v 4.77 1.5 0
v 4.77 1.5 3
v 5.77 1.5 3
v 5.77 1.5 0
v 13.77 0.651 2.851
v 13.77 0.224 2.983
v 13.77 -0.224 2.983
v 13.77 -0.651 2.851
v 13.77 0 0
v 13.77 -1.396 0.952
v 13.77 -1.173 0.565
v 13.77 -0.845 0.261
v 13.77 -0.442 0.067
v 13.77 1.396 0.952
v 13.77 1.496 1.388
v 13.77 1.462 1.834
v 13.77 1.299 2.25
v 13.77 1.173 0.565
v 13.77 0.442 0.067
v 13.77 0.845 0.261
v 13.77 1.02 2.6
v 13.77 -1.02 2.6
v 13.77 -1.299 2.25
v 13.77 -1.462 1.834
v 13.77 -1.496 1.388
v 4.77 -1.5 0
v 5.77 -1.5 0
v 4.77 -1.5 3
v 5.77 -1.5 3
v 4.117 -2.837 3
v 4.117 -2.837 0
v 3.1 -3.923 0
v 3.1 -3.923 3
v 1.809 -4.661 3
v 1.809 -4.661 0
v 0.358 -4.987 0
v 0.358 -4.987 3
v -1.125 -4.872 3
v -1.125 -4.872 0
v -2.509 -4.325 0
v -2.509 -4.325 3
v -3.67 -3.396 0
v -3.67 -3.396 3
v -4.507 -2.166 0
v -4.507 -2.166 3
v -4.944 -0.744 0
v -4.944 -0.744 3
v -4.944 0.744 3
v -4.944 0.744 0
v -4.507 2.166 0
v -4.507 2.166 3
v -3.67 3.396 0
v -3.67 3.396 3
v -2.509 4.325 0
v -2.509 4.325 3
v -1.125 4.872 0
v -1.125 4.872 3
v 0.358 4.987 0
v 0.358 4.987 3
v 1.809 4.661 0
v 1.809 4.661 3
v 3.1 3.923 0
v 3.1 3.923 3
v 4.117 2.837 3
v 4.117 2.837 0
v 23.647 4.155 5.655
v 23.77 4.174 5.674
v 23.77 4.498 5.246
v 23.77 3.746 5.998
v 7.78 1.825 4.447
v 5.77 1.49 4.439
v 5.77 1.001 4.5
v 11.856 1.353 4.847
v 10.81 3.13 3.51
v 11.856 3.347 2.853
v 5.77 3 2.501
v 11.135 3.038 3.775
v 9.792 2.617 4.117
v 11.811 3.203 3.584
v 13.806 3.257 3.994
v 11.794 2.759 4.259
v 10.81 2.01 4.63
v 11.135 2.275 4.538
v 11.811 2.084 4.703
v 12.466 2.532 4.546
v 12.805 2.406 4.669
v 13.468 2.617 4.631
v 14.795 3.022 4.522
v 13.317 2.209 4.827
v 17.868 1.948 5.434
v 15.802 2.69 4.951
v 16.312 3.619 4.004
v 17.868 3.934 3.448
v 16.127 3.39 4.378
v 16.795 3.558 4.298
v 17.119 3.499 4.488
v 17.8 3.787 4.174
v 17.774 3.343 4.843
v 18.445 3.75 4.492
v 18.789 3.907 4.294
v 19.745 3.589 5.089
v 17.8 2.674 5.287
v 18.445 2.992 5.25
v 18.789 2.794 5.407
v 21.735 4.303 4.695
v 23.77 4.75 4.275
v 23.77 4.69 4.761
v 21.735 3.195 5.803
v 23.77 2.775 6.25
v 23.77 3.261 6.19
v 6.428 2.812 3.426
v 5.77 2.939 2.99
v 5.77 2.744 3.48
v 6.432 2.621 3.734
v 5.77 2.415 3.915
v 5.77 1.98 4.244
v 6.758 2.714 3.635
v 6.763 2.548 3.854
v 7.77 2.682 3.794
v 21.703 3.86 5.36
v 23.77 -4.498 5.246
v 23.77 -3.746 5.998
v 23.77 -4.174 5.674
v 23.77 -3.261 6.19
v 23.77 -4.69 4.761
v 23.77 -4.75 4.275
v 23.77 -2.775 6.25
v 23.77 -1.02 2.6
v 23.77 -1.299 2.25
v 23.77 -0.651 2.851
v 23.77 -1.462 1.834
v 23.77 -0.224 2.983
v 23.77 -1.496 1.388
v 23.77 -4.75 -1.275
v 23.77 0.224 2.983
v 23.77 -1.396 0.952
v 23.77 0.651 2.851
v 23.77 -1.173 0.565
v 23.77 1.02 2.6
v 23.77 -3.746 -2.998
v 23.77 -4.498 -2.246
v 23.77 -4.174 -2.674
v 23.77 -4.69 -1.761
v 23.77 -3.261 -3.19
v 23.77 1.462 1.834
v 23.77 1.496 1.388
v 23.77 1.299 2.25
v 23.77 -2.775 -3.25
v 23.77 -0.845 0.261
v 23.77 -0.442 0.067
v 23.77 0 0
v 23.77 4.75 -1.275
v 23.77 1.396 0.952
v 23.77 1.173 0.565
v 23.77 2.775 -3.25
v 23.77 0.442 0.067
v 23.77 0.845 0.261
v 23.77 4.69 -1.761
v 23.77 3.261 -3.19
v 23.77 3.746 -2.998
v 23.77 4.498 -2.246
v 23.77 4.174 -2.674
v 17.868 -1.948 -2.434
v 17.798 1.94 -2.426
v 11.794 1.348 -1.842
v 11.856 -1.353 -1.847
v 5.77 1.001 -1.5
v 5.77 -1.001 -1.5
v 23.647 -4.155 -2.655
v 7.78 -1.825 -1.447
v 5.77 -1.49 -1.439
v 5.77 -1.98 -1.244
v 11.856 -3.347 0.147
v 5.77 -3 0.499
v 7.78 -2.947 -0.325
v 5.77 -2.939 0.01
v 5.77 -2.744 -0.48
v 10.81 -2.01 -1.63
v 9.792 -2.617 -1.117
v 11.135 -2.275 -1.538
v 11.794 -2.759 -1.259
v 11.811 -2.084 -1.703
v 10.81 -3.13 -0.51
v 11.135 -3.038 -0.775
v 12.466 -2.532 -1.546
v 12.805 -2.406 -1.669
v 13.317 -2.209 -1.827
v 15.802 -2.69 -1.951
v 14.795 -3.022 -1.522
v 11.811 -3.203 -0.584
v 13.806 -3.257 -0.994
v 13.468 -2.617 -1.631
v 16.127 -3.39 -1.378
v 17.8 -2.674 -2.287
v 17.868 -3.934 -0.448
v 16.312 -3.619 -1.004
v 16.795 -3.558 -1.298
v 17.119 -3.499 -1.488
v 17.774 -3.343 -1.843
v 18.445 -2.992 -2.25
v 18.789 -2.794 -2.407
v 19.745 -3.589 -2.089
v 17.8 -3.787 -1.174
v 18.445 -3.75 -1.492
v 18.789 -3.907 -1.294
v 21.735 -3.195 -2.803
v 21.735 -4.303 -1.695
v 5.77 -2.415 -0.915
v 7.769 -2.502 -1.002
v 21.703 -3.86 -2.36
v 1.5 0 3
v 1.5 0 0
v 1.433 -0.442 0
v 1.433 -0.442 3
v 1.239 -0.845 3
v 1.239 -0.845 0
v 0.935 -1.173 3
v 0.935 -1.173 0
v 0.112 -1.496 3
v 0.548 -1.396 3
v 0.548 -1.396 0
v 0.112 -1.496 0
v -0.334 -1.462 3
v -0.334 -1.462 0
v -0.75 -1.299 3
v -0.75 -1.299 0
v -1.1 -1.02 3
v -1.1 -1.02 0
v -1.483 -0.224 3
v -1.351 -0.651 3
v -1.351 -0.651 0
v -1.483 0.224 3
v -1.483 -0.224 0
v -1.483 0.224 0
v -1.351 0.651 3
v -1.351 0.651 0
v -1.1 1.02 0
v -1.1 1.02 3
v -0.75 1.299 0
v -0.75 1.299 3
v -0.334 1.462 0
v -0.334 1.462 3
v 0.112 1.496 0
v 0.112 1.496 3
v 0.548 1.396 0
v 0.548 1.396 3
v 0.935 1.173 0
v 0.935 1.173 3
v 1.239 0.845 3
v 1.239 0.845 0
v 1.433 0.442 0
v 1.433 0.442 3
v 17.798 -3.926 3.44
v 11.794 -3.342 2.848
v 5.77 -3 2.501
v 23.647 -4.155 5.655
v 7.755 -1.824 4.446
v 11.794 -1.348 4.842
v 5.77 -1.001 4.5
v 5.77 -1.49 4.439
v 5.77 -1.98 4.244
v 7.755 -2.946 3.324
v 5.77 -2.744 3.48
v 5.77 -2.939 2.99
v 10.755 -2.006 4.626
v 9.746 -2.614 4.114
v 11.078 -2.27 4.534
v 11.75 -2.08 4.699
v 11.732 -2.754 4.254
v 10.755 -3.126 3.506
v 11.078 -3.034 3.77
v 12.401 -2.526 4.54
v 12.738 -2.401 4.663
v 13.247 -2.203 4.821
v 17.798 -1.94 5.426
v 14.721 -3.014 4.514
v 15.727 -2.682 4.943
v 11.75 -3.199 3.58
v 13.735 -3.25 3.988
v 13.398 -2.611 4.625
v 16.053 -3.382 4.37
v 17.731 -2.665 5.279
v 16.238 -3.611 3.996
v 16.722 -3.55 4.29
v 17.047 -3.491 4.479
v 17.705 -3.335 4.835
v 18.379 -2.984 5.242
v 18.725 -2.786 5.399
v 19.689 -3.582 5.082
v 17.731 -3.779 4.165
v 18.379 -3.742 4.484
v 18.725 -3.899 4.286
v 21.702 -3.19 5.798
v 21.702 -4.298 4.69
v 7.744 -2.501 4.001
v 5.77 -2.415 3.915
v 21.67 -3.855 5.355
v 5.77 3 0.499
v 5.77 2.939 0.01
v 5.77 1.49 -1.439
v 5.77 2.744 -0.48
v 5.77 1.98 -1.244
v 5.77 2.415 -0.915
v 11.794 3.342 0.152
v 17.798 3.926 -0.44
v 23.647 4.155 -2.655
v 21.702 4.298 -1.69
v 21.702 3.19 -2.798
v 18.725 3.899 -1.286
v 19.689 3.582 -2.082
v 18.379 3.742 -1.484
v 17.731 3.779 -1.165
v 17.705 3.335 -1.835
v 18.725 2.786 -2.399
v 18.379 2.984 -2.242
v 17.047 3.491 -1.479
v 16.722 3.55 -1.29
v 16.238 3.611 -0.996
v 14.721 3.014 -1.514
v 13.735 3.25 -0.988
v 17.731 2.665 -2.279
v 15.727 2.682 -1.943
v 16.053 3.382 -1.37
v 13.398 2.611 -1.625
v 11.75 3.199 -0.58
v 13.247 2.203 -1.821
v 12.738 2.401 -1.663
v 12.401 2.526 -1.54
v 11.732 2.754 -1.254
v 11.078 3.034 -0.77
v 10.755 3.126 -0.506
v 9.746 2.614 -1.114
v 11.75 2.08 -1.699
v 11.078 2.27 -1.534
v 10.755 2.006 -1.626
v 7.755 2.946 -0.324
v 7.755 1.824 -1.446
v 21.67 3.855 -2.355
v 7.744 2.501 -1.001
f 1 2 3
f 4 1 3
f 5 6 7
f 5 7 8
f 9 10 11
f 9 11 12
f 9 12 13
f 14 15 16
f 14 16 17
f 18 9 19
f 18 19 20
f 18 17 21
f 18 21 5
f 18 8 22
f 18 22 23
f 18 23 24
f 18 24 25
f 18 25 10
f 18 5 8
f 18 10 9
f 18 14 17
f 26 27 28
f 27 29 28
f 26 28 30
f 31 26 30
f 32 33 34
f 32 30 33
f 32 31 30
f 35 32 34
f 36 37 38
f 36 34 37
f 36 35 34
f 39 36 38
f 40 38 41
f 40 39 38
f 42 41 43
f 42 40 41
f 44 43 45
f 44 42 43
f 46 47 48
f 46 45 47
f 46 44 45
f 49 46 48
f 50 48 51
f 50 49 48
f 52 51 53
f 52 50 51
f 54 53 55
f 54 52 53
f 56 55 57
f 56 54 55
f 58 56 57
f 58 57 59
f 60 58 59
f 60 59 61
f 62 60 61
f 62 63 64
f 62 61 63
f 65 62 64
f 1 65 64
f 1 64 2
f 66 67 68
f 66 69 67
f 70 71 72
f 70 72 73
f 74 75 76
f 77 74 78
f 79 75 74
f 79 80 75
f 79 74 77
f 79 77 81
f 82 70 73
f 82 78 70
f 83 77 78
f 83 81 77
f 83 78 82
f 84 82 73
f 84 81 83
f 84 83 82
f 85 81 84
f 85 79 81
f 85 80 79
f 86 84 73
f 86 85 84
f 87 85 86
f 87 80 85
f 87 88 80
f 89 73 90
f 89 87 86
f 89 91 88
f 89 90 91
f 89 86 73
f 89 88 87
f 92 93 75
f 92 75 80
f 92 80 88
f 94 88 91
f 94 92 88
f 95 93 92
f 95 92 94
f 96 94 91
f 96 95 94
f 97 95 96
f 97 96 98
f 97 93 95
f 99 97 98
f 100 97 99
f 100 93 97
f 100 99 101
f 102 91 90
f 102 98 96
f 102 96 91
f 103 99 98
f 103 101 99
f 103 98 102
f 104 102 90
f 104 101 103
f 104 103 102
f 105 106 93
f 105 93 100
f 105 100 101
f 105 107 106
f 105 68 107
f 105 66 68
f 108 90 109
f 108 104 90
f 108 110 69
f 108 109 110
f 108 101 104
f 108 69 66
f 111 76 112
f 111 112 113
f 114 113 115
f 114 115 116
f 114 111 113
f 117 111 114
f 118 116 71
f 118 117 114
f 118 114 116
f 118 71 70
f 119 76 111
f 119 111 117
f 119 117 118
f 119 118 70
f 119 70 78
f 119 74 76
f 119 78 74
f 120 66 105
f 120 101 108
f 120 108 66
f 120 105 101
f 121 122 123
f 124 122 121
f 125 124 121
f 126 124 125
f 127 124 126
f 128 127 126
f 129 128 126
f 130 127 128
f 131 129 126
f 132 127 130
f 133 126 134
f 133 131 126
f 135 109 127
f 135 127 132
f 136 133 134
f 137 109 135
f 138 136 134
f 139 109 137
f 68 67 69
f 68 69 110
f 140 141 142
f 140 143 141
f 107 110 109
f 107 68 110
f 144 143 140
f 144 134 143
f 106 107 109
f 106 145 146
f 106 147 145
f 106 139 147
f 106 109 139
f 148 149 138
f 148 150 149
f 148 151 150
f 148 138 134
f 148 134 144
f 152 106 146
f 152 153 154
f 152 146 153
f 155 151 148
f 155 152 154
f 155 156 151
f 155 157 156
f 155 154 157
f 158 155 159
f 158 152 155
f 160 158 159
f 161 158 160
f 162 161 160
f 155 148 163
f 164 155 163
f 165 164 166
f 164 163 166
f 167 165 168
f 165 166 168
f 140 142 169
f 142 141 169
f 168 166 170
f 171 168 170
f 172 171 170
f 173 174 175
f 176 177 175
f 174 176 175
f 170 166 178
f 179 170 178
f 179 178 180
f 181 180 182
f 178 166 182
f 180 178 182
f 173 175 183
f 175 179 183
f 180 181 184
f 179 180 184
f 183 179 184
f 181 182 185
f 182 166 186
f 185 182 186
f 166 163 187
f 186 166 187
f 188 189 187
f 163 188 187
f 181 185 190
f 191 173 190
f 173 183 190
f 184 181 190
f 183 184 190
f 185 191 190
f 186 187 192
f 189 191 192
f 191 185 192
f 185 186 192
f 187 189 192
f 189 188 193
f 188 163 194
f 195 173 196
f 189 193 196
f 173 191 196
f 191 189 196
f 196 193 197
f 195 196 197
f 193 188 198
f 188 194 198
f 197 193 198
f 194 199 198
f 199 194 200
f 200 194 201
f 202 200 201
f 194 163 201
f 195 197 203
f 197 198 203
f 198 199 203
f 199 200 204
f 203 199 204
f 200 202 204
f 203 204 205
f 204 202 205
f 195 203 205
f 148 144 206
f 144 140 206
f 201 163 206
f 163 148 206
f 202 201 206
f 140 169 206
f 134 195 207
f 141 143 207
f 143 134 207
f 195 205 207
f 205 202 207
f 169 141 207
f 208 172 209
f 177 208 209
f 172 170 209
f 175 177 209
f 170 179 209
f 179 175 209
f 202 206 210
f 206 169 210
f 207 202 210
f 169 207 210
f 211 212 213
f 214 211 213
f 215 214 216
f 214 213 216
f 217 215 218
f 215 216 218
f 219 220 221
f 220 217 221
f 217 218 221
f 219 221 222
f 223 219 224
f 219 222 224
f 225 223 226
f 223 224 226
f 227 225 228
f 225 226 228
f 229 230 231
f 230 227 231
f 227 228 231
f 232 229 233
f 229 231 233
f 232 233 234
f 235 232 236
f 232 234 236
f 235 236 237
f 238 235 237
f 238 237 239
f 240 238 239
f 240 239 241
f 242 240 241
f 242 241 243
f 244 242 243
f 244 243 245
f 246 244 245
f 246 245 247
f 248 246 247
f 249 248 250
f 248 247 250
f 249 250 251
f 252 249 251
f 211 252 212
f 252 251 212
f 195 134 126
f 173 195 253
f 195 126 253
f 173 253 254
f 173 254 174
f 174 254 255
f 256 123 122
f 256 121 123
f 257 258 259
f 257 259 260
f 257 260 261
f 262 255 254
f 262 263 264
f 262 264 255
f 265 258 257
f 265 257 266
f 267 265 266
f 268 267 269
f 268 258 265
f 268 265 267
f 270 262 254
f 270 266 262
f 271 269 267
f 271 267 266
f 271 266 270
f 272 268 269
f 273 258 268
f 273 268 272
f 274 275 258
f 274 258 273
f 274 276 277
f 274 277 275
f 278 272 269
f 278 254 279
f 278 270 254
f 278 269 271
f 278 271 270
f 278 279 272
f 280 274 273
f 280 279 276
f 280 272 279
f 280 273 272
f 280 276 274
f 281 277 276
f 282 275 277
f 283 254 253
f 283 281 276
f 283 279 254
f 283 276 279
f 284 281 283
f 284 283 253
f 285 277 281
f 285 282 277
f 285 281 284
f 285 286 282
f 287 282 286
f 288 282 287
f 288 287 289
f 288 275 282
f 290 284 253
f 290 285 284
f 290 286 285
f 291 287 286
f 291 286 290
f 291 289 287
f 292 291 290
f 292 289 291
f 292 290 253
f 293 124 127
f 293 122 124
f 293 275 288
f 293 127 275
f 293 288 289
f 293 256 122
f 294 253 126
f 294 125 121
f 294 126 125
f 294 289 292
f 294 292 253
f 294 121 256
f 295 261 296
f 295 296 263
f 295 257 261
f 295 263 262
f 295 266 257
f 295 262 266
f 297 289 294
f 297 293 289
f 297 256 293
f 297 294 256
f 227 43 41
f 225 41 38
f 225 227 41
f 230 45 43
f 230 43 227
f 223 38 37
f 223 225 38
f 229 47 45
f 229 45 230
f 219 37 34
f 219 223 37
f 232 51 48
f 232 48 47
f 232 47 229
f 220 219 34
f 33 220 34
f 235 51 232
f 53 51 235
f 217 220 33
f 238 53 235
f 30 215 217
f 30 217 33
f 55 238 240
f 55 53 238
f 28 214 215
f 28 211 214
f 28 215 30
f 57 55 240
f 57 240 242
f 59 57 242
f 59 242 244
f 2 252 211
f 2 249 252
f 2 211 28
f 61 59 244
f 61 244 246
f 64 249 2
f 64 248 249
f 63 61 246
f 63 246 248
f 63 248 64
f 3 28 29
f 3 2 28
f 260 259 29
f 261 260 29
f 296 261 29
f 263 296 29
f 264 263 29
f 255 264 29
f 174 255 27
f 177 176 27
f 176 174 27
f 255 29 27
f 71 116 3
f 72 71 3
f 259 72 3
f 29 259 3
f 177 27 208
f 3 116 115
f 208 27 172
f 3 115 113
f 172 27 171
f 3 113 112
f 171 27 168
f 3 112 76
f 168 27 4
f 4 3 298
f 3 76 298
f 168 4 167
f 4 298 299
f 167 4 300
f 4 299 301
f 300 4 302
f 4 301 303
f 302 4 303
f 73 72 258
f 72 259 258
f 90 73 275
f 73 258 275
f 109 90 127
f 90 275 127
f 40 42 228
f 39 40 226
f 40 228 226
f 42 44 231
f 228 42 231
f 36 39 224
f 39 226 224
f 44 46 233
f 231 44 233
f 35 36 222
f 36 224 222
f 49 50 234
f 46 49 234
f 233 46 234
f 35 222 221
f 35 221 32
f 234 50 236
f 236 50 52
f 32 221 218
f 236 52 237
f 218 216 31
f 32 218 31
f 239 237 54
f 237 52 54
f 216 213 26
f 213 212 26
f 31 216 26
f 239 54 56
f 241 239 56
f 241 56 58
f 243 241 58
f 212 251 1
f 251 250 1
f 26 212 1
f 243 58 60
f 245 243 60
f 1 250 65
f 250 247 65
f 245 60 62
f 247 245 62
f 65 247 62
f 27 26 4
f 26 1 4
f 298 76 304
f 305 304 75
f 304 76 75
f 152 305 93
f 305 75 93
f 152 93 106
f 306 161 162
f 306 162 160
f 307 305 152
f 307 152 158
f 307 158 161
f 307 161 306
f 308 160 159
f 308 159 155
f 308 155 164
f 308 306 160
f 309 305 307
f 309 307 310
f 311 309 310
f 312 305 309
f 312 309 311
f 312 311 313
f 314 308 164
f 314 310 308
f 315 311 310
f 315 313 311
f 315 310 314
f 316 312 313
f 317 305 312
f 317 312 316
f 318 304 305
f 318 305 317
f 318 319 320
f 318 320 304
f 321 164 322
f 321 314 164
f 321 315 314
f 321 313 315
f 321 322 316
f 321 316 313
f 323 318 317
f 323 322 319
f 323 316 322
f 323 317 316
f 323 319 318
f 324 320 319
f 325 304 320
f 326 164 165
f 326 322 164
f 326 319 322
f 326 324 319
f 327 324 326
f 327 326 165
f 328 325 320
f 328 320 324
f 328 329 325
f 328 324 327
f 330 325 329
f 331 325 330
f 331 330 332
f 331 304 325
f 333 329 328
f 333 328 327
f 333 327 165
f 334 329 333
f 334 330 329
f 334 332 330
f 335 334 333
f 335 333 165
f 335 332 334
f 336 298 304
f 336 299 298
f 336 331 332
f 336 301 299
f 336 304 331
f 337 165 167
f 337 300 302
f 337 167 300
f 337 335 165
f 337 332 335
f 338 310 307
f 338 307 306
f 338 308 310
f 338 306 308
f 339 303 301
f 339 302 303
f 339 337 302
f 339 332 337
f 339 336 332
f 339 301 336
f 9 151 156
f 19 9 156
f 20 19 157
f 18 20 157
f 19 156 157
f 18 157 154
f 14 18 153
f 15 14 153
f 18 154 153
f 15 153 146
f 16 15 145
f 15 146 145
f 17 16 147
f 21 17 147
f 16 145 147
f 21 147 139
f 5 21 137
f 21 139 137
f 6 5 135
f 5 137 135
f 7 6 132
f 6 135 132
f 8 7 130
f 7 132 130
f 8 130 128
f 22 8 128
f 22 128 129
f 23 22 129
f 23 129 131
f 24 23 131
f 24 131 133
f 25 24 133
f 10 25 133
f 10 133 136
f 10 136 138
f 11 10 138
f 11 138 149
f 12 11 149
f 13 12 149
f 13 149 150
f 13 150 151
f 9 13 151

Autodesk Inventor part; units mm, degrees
ref_plane "YZ Plane" through (0, 0, 0) normal (1, 0, 0) x (0, 1, 0)
ref_plane "XZ Plane" through (0, 0, 0) normal (0, 1, 0) x (-1, 0, 0)
ref_plane "XY Plane" through (0, 0, 0) normal (0, 0, 1) x (1, 0, 0)
sketch "Sketch1" plane through (0, 0, 0) normal (0, 0, 1) x (1, 0, 0)
  circle A0 centre (0, 0) radius 1.5
  circle A1 centre (0, 0) radius 5
  dimension "d0" = 3
  dimension "d1" = 10
extrude "Extrusion1" add sketch "Sketch1" along normal blind 3
sketch "Sketch2" plane through (0, 0, 3) normal (0, 0, 1) x (1, 0, 0)
  circle A0 centre (0, 0) radius 5 projected
  line L0 (4.7697, 1.5) -> (5.7697, 1.5)
  line L1 (5.7697, 1.5) -> (5.7697, -1.5)
  line L2 (5.7697, -1.5) -> (4.7697, -1.5)
  line L3 (4.7697, -1.5) -> (4.7697, 1.5)
  circle A1 centre (0, 0) radius 5 projected
  point P0 (4.7697, 0)
  dimension "d4" = 1
  dimension "d8" = 3
extrude "Extrusion2" add sketch "Sketch2" against normal blind 3 contours A0 L3 | A0 L0 L1 L2 picked at (4.8122, -0.3362)
sketch "Sketch3" plane through (5.7697, -1.5, 3) normal (1, 0, 0) x (0, 0, -1)
  line L0 (-1.5, 4.5) -> (4.5, 4.5)
  line L1 (4.5, 4.5) -> (4.5, -1.5)
  line L2 (4.5, -1.5) -> (-1.5, -1.5)
  line L3 (-1.5, -1.5) -> (-1.5, 4.5)
  line L4 (0, 3) -> (3, 3) projected
  line L5 (0, 3) -> (0, 0) projected
  point P0 (3, 1.5)
  point P1 (0, 1.5)
  point P2 (-1.5, 1.5)
  point P3 (1.5, 3)
  point P4 (1.5, 4.5)
  dimension "d9" = 6
  dimension "d10" = 6
extrude "Extrusion3" add sketch "Sketch3" along normal blind 18
sketch "Sketch4" plane through (5.7697, -3, 4.5) normal (0, 0, 1) x (1, 0, 0)
  line L0 (18, 7.75) -> (18, -1.75)
  line L1 (18, 6) -> (18, 0) projected
  line L2 (0, 0) -> (0, 6) projected
  arc A0 (0, 6) -> (18, 7.75) centre (-5.4885, 155.8996) ccw
  arc A1 (18, -1.75) -> (0, 0) centre (-5.4885, -149.8996) ccw
  line L3 (0, 0) -> (18, 0) projected
  line L4 (0, 0) -> (18, 0)
  line L5 (18, 0) -> (18, -1.75)
  line L6 (0, 6) -> (18, 6) projected
  line L7 (0, 6) -> (18, 6)
  line L8 (18, 6) -> (18, 7.75)
  point P0 (-5.7697, 3)
  point P1 (18, 3)
  dimension "d13" = 9.5
  dimension "d14" = 150
  dimension "d15" = 150
extrude "Extrusion4" add sketch "Sketch4" against normal blind 6 contours L0 L6 A0 | L0 A1 L3
sketch "Sketch5" plane through (4.7697, 1.5, 3) normal (0, 1, 0) x (1, 0, 0)
  line L0 (19, 6.25) -> (19, -3.25)
  line L1 (19, -1.5) -> (19, 4.5) projected
  arc A0 (1, 4.5) -> (19, 6.25) centre (-4.4885, 154.3996) ccw
  line L2 (19, -1.5) -> (1, -1.5) projected
  arc A1 (19, -3.25) -> (1, -1.5) centre (-4.4885, -151.3996) ccw
  line L3 (1, 4.5) -> (19, 4.5)
  line L4 (19, 4.5) -> (19, 6.25)
  line L5 (1, -1.5) -> (19, -1.5)
  line L6 (19, -1.5) -> (19, -3.25)
  point P0 (-4.7697, 3)
  point P1 (19, 1.5)
  dimension "d18" = 9.5
  dimension "d19" = 150
  dimension "d20" = 150
extrude "Extrusion5" add sketch "Sketch5" along normal blind 3.25 and the other way blind 6.25
sketch "Sketch6" plane through (5.7697, -4.75, -1.5) normal (0, 0, 1) x (1, 0, 0)
  arc A0 (0, 7.75) -> (18, 9.5) centre (-5.4885, 157.6496) ccw projected
  line L0 (0, 9.5) -> (18, 9.5) projected
  line L1 (0, 7.75) -> (0, 9.5) projected
  arc A1 (18, 0) -> (0, 1.75) centre (-5.4885, -148.1496) ccw projected
  line L2 (0, 0) -> (0, 1.75) projected
  line L3 (18, 0) -> (0, 0) projected
  point P0 (-5.7697, 4.75)
extrude "Extrusion6" cut sketch "Sketch6" along normal through all both and the other way through all
fillet "Fillet1" radius 2 4 edges at (14.7961, 3.6035, -2.1035) (14.872, 3.6109, 5.1109) (14.872, -3.6109, 5.1109) (14.7961, -3.6035, -2.1035)
sketch "Sketch7" plane through (23.7697, -1.5, 3) normal (1, 0, 0) x (0, 0, -1)
  circle A0 centre (1.5, 1.5) radius 1.5
  line L0 (-3.25, 4.2747) -> (-3.25, -1.2747) projected
  line L1 (-1.2747, 6.25) -> (4.2747, 6.25) projected
  point P0 (3, 1.5)
  point P1 (1.5, 6.25)
  point P2 (-3.25, 1.5)
  dimension "d28" = 3
extrude "Extrusion7" cut sketch "Sketch7" against normal blind 10
properties part number "Arm4" material "ABS Plastic"
